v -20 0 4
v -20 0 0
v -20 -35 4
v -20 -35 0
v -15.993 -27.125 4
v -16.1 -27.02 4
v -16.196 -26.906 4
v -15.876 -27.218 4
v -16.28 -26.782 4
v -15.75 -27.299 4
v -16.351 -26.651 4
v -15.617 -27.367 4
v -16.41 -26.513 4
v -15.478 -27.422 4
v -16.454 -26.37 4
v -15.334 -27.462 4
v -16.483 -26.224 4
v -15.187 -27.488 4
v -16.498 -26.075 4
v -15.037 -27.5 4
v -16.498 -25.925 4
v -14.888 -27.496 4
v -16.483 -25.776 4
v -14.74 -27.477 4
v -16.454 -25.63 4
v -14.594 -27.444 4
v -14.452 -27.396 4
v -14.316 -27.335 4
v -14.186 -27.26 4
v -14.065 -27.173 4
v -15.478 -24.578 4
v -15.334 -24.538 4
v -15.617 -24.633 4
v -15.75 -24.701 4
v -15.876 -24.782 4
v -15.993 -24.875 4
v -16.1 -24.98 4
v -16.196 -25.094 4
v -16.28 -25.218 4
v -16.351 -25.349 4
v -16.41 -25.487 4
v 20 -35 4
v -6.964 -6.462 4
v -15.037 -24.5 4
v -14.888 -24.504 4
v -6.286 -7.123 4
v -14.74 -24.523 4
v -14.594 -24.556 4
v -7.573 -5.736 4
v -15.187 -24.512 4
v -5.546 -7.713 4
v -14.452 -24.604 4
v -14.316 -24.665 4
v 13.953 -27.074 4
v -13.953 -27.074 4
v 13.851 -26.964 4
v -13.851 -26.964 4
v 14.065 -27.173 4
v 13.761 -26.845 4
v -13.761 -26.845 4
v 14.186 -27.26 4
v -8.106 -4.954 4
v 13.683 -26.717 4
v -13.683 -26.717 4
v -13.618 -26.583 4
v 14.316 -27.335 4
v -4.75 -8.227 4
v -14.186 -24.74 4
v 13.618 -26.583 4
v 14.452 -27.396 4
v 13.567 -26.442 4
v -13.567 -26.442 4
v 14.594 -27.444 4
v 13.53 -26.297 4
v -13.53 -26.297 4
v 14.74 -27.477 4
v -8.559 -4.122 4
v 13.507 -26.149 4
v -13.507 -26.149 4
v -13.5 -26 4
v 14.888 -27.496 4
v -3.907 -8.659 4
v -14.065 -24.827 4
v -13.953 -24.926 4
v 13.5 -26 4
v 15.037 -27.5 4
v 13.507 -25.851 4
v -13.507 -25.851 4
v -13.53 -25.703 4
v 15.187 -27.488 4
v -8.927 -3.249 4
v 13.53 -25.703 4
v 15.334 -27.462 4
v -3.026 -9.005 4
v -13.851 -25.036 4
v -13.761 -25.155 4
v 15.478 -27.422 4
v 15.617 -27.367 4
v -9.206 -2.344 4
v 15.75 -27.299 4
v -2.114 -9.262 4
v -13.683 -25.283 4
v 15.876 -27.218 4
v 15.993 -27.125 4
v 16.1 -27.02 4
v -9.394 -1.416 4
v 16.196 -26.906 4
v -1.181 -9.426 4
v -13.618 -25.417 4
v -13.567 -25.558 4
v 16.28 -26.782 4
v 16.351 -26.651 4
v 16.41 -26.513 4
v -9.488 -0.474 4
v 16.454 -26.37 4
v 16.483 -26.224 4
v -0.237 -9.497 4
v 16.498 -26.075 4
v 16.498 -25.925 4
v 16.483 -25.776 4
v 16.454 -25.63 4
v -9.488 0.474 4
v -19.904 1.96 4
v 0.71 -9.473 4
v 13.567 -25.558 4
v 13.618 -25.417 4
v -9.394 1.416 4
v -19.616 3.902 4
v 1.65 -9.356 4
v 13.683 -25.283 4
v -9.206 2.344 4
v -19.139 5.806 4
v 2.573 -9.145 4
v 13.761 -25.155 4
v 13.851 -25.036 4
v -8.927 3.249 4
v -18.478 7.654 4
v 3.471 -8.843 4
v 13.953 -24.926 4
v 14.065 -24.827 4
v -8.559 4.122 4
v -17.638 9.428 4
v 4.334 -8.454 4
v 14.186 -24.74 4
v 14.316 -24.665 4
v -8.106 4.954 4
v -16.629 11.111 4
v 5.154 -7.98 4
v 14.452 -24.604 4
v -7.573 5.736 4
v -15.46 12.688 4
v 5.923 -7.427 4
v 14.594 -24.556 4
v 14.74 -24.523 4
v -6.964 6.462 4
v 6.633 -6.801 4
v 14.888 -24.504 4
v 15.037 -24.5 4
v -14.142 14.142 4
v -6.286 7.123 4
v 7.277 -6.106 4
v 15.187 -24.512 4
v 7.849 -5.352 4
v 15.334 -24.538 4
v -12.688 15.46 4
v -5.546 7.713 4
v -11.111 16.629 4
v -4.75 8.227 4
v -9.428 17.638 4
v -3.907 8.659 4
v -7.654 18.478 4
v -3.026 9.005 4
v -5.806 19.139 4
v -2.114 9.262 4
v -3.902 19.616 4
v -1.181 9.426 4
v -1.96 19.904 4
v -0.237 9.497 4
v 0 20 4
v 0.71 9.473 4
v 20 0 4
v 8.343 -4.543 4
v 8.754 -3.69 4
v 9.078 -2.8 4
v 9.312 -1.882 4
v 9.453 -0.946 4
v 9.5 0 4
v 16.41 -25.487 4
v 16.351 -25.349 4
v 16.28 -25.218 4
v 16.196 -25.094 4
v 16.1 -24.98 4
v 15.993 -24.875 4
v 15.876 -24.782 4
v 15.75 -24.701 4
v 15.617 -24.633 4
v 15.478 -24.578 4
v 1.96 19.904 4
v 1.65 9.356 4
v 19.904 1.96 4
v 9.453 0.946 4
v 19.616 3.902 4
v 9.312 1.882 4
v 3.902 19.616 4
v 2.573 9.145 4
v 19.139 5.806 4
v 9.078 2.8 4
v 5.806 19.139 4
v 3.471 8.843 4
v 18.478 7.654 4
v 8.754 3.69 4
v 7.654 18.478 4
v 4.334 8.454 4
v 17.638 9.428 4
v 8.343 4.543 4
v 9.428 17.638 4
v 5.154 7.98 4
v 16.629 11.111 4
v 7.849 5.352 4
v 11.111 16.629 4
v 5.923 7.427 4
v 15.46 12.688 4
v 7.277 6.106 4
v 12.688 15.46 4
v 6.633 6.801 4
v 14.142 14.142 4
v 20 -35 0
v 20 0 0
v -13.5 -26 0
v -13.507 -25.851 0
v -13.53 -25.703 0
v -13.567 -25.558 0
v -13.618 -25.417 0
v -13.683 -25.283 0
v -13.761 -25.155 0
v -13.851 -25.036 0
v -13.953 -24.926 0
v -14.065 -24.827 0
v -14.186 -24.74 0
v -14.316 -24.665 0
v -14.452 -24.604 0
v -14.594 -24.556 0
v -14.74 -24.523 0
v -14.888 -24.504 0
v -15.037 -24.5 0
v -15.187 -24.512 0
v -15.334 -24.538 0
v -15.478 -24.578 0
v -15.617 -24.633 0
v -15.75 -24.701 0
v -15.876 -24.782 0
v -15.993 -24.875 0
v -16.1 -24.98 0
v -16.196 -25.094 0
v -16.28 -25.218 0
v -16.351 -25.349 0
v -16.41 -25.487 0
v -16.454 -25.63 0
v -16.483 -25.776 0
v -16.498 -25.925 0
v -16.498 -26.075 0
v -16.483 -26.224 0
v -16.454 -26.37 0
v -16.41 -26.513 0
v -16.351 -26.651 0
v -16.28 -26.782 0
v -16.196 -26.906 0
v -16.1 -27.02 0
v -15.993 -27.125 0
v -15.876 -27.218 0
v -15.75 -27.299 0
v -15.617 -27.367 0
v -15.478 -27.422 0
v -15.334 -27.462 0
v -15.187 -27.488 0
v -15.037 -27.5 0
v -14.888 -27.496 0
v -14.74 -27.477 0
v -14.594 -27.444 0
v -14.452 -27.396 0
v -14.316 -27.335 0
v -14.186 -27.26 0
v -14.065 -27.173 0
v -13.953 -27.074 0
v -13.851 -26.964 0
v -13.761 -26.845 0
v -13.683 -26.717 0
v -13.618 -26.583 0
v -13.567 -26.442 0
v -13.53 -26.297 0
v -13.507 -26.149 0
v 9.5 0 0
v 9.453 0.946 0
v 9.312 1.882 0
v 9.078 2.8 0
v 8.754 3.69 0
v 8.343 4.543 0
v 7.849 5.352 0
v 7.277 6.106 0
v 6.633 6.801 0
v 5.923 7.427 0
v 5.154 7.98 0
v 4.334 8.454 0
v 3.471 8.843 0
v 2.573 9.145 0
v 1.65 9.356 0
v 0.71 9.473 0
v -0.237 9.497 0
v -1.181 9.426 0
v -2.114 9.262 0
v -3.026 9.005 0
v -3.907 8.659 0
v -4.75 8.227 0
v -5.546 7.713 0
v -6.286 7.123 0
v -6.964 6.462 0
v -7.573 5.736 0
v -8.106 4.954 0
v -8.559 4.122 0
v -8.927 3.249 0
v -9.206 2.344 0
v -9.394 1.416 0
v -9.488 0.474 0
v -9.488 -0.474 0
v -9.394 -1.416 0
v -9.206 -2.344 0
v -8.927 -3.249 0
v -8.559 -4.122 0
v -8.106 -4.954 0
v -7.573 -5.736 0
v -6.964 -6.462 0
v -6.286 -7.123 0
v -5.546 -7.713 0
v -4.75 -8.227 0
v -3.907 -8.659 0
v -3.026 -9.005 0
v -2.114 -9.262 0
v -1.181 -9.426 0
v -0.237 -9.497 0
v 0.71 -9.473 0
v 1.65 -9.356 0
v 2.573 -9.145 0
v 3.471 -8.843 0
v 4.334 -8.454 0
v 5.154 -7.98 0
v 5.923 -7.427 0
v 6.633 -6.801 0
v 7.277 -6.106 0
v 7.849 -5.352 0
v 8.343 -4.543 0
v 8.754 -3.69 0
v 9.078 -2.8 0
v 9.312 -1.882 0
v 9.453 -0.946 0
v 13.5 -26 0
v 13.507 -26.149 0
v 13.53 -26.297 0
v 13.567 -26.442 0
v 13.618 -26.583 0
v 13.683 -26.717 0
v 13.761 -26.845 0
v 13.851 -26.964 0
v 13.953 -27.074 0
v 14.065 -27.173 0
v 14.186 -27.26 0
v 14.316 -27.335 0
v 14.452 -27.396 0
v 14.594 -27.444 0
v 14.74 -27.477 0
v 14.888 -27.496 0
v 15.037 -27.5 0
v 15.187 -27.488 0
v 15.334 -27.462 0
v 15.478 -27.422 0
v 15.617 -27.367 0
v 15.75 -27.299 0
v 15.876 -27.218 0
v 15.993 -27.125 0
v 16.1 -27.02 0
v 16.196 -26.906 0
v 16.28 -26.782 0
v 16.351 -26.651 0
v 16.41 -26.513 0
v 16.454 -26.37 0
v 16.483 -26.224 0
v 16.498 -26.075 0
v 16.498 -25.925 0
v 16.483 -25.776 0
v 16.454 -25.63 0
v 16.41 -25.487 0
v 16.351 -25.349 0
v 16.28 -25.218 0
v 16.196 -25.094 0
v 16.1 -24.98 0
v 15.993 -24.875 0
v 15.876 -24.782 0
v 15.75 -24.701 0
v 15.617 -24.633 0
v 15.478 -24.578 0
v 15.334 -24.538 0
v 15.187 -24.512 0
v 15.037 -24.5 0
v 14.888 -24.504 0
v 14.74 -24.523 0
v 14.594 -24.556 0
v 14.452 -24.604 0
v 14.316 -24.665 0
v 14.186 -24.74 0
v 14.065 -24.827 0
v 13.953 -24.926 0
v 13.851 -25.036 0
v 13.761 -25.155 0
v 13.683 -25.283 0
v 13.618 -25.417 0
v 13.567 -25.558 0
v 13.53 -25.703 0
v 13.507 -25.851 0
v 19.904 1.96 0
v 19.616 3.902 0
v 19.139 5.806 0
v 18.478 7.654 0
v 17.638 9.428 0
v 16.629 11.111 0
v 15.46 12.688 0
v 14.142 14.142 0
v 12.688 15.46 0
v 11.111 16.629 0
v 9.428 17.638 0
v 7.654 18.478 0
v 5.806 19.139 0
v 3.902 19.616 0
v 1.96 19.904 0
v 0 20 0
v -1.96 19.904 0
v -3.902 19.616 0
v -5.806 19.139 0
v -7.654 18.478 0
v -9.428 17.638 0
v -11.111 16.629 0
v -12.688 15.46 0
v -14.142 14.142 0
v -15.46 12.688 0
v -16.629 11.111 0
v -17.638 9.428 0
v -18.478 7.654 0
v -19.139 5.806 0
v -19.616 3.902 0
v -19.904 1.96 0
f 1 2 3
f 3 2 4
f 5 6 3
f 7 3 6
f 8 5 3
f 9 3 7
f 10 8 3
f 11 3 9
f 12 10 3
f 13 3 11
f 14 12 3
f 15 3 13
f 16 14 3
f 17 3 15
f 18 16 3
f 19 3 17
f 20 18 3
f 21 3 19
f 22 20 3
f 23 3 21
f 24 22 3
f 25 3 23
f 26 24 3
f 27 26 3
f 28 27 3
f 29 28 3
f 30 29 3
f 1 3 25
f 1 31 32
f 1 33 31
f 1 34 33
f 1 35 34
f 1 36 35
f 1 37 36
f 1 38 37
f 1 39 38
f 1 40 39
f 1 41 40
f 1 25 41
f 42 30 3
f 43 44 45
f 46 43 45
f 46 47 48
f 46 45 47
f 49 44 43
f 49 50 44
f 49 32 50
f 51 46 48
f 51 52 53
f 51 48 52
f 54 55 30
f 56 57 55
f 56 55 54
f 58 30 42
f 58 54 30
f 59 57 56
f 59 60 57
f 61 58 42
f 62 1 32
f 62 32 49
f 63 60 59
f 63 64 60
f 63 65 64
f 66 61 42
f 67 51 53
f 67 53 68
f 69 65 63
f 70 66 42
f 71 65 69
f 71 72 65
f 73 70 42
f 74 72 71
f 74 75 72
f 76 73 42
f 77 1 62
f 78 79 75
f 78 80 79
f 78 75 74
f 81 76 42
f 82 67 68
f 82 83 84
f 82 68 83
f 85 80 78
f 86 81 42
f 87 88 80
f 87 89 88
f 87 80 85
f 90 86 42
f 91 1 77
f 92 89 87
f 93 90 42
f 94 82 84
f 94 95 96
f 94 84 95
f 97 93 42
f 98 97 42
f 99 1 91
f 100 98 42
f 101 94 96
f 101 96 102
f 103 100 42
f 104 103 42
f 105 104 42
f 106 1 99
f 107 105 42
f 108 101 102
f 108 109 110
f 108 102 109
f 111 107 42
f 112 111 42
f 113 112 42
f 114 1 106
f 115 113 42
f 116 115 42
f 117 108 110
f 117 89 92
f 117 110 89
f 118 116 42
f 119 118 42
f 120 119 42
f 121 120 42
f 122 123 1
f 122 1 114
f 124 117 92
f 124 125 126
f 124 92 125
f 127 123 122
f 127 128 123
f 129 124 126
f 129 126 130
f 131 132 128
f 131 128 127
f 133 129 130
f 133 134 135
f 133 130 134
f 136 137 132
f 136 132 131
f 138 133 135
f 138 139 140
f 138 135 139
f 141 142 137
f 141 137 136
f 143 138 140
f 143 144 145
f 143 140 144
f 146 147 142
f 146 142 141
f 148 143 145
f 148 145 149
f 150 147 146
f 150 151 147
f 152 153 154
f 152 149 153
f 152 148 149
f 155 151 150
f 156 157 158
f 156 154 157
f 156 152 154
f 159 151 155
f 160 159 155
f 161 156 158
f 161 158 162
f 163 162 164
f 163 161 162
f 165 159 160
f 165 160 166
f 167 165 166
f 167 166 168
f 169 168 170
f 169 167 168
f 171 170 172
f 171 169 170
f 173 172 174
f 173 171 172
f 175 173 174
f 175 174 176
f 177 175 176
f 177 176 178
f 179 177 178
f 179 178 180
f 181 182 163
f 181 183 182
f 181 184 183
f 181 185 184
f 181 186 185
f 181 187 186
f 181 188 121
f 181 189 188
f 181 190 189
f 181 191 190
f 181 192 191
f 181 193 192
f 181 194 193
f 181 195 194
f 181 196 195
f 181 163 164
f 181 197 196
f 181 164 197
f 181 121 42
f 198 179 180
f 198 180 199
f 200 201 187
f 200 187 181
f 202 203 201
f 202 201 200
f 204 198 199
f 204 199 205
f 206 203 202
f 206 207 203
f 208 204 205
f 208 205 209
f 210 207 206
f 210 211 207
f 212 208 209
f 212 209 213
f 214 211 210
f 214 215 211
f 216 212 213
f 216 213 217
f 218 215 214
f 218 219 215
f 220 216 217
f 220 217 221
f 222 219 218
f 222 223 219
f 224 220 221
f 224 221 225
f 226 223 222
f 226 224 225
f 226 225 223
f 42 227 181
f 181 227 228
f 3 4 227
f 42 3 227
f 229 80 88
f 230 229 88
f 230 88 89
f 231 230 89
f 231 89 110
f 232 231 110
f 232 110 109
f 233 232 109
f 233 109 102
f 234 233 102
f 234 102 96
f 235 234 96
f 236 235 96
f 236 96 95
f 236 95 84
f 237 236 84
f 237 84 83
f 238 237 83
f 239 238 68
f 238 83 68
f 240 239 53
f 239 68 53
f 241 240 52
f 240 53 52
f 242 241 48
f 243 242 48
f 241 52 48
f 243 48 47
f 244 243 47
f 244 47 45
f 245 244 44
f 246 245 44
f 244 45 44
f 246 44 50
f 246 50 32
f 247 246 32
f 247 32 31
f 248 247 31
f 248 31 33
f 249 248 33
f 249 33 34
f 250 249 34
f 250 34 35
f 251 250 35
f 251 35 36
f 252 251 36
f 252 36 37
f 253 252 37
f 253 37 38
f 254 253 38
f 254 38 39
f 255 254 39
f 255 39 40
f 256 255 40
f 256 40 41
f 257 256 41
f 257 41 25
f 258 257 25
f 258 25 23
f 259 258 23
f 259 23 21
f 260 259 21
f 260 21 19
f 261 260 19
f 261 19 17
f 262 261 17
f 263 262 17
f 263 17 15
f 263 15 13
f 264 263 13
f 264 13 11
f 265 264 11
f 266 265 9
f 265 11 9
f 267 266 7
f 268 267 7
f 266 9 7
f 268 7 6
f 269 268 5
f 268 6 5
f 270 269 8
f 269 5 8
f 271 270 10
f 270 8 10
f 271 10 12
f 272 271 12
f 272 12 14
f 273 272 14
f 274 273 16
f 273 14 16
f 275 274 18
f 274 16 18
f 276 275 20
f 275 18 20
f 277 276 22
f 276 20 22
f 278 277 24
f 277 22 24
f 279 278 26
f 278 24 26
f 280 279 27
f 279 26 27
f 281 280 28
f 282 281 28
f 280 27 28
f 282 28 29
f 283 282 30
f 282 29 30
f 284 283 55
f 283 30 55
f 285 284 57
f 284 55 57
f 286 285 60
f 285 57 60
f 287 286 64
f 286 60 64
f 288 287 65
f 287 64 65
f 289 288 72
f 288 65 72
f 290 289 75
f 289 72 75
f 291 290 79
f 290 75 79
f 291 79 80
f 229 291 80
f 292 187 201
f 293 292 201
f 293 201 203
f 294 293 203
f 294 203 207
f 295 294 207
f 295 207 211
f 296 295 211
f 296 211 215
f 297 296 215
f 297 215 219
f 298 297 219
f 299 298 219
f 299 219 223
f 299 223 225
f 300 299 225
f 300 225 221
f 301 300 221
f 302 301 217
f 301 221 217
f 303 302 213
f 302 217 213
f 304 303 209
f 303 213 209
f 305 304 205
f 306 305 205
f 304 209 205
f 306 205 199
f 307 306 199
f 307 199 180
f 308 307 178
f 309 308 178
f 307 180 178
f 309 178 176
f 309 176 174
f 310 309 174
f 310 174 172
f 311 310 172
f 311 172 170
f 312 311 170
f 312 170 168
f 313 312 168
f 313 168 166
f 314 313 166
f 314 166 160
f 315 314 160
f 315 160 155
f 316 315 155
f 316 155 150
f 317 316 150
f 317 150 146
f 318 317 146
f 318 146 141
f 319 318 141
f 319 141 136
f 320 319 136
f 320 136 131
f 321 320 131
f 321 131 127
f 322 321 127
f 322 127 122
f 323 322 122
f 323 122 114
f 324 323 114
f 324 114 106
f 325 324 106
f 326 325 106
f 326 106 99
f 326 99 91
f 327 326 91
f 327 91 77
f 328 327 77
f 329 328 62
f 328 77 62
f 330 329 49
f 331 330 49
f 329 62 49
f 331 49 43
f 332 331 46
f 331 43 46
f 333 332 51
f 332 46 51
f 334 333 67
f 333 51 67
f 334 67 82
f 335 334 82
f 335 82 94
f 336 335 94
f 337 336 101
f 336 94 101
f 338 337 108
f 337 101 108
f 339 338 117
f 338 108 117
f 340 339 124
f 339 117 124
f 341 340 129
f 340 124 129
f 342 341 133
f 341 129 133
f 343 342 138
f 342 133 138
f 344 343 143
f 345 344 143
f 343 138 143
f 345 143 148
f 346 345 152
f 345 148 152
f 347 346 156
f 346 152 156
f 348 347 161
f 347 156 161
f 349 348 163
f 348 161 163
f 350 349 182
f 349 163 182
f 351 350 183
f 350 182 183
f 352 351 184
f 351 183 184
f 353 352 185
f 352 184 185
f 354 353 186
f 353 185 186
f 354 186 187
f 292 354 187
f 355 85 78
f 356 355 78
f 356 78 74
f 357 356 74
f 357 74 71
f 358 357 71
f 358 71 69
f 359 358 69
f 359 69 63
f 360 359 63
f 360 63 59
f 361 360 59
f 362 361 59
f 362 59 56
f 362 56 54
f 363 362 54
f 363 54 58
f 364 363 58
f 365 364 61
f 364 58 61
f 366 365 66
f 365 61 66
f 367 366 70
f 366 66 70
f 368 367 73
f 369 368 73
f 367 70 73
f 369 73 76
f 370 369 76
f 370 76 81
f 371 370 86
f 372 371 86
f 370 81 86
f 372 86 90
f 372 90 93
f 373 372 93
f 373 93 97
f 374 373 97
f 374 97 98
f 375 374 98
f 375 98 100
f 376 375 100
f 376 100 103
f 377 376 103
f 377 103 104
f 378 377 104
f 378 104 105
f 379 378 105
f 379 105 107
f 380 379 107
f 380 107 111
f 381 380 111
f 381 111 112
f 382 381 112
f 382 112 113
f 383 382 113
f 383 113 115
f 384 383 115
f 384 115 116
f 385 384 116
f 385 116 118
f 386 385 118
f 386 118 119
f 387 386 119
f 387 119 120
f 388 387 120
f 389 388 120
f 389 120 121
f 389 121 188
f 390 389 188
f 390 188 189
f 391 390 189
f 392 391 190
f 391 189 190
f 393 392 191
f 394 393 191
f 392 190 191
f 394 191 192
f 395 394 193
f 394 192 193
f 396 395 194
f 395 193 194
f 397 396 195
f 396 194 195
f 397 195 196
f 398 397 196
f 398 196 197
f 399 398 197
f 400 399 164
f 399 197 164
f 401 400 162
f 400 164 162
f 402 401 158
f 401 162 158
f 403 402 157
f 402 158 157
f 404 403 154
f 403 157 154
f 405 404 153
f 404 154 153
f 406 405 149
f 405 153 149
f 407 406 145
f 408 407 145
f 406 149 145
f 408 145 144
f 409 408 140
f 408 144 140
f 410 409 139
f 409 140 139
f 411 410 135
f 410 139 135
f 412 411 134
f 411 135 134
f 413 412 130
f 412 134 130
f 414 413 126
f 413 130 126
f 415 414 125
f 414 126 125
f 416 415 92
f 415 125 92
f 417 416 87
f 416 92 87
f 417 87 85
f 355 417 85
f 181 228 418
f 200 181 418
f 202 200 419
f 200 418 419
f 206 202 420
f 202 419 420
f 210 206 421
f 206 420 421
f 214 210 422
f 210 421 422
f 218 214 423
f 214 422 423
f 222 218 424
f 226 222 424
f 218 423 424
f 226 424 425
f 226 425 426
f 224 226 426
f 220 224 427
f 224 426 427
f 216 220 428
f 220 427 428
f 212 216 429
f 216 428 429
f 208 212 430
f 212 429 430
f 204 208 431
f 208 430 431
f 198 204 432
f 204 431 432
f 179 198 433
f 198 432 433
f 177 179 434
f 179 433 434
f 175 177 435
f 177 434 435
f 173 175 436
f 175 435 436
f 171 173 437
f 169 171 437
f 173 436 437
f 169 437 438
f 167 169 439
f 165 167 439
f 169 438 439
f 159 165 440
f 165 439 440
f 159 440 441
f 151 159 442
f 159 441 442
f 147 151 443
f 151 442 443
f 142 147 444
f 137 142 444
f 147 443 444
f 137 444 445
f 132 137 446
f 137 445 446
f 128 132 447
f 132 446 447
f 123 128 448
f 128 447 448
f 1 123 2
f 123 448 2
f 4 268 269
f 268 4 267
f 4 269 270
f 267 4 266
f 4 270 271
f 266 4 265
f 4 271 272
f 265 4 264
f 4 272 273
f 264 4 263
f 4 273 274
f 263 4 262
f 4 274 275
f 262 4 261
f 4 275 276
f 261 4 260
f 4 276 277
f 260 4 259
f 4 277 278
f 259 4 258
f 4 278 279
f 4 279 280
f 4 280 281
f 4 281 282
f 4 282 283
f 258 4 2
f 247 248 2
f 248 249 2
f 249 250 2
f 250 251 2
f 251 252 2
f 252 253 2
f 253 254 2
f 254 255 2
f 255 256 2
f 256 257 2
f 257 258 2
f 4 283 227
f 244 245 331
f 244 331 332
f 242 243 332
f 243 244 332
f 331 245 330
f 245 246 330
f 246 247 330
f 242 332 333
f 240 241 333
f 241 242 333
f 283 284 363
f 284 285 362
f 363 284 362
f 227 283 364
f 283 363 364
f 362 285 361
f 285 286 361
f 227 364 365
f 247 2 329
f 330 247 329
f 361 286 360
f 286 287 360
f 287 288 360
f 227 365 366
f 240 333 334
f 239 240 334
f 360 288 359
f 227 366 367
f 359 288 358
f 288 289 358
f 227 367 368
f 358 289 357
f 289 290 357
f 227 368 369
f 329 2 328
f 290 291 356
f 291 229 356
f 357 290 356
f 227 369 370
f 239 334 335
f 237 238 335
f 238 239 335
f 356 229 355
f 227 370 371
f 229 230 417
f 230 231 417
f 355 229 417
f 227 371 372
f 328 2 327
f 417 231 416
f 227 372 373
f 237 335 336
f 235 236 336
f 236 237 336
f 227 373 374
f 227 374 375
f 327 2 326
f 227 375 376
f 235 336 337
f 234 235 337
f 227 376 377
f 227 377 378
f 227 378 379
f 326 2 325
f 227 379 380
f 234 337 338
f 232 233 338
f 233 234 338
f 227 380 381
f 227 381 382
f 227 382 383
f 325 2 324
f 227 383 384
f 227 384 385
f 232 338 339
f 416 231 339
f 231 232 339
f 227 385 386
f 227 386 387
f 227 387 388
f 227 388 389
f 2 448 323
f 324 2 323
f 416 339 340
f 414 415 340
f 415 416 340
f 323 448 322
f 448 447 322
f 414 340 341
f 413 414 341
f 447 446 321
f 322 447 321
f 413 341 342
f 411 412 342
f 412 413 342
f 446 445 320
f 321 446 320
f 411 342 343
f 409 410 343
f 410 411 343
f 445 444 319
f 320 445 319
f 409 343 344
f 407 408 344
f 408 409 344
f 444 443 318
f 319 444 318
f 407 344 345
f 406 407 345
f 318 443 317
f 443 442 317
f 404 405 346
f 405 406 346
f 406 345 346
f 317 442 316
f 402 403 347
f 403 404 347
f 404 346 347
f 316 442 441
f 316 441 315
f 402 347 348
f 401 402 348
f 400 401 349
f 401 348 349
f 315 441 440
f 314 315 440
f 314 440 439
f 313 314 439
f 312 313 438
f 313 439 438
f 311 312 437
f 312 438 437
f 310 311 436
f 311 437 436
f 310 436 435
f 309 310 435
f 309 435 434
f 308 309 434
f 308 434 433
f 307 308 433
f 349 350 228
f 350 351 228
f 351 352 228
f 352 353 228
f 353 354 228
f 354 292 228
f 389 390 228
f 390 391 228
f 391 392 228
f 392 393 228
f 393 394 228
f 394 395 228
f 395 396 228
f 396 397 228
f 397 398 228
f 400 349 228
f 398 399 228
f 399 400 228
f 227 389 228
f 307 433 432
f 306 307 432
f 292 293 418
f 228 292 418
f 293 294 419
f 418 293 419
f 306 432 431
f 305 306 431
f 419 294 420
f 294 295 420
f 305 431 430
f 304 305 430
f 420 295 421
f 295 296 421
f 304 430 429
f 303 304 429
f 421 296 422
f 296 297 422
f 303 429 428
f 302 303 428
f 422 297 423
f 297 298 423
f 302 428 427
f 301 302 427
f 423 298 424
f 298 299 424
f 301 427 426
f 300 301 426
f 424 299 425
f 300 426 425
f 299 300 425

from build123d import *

# Parameters (mm, degrees)
SKETCH_1_R          = 20
EXTRUDE_1_DEPTH     = 4
SKETCH_2_R          = 9.5
CUT_EXTRUDE_1_DEPTH = 41.509258201
SKETCH_4_R          = 1.5
CUT_EXTRUDE_2_DEPTH = 41.509258201


with BuildPart() as part:
    # 草图1 → 凸台-拉伸1 (new body)
    with BuildSketch(Plane.XY):
        Circle(SKETCH_1_R)
        with BuildLine():
            ThreePointArc((20, 0), (0, -20), (-20, 0))
            Line((-20, 0), (-20, -35))
            Line((-20, -35), (20, -35))
            Line((20, -35), (20, 0))
        make_face()
    extrude(amount=EXTRUDE_1_DEPTH)

    # 草图2 → 切除-拉伸1 (cut, through all)
    with BuildSketch(Plane.XY.offset(4)):
        Circle(SKETCH_2_R)
    extrude(amount=-CUT_EXTRUDE_1_DEPTH, mode=Mode.SUBTRACT)

    # 草图4 → 切除-拉伸2 (cut, through all)
    with BuildSketch(Plane.XY.offset(4)):
        with Locations((-15, -26)):
            Circle(SKETCH_4_R)
        with Locations(Location((15, -26, 0), (0, 0, 180))):
            Circle(SKETCH_4_R)
    extrude(amount=-CUT_EXTRUDE_2_DEPTH, mode=Mode.SUBTRACT)


solid = part.part
